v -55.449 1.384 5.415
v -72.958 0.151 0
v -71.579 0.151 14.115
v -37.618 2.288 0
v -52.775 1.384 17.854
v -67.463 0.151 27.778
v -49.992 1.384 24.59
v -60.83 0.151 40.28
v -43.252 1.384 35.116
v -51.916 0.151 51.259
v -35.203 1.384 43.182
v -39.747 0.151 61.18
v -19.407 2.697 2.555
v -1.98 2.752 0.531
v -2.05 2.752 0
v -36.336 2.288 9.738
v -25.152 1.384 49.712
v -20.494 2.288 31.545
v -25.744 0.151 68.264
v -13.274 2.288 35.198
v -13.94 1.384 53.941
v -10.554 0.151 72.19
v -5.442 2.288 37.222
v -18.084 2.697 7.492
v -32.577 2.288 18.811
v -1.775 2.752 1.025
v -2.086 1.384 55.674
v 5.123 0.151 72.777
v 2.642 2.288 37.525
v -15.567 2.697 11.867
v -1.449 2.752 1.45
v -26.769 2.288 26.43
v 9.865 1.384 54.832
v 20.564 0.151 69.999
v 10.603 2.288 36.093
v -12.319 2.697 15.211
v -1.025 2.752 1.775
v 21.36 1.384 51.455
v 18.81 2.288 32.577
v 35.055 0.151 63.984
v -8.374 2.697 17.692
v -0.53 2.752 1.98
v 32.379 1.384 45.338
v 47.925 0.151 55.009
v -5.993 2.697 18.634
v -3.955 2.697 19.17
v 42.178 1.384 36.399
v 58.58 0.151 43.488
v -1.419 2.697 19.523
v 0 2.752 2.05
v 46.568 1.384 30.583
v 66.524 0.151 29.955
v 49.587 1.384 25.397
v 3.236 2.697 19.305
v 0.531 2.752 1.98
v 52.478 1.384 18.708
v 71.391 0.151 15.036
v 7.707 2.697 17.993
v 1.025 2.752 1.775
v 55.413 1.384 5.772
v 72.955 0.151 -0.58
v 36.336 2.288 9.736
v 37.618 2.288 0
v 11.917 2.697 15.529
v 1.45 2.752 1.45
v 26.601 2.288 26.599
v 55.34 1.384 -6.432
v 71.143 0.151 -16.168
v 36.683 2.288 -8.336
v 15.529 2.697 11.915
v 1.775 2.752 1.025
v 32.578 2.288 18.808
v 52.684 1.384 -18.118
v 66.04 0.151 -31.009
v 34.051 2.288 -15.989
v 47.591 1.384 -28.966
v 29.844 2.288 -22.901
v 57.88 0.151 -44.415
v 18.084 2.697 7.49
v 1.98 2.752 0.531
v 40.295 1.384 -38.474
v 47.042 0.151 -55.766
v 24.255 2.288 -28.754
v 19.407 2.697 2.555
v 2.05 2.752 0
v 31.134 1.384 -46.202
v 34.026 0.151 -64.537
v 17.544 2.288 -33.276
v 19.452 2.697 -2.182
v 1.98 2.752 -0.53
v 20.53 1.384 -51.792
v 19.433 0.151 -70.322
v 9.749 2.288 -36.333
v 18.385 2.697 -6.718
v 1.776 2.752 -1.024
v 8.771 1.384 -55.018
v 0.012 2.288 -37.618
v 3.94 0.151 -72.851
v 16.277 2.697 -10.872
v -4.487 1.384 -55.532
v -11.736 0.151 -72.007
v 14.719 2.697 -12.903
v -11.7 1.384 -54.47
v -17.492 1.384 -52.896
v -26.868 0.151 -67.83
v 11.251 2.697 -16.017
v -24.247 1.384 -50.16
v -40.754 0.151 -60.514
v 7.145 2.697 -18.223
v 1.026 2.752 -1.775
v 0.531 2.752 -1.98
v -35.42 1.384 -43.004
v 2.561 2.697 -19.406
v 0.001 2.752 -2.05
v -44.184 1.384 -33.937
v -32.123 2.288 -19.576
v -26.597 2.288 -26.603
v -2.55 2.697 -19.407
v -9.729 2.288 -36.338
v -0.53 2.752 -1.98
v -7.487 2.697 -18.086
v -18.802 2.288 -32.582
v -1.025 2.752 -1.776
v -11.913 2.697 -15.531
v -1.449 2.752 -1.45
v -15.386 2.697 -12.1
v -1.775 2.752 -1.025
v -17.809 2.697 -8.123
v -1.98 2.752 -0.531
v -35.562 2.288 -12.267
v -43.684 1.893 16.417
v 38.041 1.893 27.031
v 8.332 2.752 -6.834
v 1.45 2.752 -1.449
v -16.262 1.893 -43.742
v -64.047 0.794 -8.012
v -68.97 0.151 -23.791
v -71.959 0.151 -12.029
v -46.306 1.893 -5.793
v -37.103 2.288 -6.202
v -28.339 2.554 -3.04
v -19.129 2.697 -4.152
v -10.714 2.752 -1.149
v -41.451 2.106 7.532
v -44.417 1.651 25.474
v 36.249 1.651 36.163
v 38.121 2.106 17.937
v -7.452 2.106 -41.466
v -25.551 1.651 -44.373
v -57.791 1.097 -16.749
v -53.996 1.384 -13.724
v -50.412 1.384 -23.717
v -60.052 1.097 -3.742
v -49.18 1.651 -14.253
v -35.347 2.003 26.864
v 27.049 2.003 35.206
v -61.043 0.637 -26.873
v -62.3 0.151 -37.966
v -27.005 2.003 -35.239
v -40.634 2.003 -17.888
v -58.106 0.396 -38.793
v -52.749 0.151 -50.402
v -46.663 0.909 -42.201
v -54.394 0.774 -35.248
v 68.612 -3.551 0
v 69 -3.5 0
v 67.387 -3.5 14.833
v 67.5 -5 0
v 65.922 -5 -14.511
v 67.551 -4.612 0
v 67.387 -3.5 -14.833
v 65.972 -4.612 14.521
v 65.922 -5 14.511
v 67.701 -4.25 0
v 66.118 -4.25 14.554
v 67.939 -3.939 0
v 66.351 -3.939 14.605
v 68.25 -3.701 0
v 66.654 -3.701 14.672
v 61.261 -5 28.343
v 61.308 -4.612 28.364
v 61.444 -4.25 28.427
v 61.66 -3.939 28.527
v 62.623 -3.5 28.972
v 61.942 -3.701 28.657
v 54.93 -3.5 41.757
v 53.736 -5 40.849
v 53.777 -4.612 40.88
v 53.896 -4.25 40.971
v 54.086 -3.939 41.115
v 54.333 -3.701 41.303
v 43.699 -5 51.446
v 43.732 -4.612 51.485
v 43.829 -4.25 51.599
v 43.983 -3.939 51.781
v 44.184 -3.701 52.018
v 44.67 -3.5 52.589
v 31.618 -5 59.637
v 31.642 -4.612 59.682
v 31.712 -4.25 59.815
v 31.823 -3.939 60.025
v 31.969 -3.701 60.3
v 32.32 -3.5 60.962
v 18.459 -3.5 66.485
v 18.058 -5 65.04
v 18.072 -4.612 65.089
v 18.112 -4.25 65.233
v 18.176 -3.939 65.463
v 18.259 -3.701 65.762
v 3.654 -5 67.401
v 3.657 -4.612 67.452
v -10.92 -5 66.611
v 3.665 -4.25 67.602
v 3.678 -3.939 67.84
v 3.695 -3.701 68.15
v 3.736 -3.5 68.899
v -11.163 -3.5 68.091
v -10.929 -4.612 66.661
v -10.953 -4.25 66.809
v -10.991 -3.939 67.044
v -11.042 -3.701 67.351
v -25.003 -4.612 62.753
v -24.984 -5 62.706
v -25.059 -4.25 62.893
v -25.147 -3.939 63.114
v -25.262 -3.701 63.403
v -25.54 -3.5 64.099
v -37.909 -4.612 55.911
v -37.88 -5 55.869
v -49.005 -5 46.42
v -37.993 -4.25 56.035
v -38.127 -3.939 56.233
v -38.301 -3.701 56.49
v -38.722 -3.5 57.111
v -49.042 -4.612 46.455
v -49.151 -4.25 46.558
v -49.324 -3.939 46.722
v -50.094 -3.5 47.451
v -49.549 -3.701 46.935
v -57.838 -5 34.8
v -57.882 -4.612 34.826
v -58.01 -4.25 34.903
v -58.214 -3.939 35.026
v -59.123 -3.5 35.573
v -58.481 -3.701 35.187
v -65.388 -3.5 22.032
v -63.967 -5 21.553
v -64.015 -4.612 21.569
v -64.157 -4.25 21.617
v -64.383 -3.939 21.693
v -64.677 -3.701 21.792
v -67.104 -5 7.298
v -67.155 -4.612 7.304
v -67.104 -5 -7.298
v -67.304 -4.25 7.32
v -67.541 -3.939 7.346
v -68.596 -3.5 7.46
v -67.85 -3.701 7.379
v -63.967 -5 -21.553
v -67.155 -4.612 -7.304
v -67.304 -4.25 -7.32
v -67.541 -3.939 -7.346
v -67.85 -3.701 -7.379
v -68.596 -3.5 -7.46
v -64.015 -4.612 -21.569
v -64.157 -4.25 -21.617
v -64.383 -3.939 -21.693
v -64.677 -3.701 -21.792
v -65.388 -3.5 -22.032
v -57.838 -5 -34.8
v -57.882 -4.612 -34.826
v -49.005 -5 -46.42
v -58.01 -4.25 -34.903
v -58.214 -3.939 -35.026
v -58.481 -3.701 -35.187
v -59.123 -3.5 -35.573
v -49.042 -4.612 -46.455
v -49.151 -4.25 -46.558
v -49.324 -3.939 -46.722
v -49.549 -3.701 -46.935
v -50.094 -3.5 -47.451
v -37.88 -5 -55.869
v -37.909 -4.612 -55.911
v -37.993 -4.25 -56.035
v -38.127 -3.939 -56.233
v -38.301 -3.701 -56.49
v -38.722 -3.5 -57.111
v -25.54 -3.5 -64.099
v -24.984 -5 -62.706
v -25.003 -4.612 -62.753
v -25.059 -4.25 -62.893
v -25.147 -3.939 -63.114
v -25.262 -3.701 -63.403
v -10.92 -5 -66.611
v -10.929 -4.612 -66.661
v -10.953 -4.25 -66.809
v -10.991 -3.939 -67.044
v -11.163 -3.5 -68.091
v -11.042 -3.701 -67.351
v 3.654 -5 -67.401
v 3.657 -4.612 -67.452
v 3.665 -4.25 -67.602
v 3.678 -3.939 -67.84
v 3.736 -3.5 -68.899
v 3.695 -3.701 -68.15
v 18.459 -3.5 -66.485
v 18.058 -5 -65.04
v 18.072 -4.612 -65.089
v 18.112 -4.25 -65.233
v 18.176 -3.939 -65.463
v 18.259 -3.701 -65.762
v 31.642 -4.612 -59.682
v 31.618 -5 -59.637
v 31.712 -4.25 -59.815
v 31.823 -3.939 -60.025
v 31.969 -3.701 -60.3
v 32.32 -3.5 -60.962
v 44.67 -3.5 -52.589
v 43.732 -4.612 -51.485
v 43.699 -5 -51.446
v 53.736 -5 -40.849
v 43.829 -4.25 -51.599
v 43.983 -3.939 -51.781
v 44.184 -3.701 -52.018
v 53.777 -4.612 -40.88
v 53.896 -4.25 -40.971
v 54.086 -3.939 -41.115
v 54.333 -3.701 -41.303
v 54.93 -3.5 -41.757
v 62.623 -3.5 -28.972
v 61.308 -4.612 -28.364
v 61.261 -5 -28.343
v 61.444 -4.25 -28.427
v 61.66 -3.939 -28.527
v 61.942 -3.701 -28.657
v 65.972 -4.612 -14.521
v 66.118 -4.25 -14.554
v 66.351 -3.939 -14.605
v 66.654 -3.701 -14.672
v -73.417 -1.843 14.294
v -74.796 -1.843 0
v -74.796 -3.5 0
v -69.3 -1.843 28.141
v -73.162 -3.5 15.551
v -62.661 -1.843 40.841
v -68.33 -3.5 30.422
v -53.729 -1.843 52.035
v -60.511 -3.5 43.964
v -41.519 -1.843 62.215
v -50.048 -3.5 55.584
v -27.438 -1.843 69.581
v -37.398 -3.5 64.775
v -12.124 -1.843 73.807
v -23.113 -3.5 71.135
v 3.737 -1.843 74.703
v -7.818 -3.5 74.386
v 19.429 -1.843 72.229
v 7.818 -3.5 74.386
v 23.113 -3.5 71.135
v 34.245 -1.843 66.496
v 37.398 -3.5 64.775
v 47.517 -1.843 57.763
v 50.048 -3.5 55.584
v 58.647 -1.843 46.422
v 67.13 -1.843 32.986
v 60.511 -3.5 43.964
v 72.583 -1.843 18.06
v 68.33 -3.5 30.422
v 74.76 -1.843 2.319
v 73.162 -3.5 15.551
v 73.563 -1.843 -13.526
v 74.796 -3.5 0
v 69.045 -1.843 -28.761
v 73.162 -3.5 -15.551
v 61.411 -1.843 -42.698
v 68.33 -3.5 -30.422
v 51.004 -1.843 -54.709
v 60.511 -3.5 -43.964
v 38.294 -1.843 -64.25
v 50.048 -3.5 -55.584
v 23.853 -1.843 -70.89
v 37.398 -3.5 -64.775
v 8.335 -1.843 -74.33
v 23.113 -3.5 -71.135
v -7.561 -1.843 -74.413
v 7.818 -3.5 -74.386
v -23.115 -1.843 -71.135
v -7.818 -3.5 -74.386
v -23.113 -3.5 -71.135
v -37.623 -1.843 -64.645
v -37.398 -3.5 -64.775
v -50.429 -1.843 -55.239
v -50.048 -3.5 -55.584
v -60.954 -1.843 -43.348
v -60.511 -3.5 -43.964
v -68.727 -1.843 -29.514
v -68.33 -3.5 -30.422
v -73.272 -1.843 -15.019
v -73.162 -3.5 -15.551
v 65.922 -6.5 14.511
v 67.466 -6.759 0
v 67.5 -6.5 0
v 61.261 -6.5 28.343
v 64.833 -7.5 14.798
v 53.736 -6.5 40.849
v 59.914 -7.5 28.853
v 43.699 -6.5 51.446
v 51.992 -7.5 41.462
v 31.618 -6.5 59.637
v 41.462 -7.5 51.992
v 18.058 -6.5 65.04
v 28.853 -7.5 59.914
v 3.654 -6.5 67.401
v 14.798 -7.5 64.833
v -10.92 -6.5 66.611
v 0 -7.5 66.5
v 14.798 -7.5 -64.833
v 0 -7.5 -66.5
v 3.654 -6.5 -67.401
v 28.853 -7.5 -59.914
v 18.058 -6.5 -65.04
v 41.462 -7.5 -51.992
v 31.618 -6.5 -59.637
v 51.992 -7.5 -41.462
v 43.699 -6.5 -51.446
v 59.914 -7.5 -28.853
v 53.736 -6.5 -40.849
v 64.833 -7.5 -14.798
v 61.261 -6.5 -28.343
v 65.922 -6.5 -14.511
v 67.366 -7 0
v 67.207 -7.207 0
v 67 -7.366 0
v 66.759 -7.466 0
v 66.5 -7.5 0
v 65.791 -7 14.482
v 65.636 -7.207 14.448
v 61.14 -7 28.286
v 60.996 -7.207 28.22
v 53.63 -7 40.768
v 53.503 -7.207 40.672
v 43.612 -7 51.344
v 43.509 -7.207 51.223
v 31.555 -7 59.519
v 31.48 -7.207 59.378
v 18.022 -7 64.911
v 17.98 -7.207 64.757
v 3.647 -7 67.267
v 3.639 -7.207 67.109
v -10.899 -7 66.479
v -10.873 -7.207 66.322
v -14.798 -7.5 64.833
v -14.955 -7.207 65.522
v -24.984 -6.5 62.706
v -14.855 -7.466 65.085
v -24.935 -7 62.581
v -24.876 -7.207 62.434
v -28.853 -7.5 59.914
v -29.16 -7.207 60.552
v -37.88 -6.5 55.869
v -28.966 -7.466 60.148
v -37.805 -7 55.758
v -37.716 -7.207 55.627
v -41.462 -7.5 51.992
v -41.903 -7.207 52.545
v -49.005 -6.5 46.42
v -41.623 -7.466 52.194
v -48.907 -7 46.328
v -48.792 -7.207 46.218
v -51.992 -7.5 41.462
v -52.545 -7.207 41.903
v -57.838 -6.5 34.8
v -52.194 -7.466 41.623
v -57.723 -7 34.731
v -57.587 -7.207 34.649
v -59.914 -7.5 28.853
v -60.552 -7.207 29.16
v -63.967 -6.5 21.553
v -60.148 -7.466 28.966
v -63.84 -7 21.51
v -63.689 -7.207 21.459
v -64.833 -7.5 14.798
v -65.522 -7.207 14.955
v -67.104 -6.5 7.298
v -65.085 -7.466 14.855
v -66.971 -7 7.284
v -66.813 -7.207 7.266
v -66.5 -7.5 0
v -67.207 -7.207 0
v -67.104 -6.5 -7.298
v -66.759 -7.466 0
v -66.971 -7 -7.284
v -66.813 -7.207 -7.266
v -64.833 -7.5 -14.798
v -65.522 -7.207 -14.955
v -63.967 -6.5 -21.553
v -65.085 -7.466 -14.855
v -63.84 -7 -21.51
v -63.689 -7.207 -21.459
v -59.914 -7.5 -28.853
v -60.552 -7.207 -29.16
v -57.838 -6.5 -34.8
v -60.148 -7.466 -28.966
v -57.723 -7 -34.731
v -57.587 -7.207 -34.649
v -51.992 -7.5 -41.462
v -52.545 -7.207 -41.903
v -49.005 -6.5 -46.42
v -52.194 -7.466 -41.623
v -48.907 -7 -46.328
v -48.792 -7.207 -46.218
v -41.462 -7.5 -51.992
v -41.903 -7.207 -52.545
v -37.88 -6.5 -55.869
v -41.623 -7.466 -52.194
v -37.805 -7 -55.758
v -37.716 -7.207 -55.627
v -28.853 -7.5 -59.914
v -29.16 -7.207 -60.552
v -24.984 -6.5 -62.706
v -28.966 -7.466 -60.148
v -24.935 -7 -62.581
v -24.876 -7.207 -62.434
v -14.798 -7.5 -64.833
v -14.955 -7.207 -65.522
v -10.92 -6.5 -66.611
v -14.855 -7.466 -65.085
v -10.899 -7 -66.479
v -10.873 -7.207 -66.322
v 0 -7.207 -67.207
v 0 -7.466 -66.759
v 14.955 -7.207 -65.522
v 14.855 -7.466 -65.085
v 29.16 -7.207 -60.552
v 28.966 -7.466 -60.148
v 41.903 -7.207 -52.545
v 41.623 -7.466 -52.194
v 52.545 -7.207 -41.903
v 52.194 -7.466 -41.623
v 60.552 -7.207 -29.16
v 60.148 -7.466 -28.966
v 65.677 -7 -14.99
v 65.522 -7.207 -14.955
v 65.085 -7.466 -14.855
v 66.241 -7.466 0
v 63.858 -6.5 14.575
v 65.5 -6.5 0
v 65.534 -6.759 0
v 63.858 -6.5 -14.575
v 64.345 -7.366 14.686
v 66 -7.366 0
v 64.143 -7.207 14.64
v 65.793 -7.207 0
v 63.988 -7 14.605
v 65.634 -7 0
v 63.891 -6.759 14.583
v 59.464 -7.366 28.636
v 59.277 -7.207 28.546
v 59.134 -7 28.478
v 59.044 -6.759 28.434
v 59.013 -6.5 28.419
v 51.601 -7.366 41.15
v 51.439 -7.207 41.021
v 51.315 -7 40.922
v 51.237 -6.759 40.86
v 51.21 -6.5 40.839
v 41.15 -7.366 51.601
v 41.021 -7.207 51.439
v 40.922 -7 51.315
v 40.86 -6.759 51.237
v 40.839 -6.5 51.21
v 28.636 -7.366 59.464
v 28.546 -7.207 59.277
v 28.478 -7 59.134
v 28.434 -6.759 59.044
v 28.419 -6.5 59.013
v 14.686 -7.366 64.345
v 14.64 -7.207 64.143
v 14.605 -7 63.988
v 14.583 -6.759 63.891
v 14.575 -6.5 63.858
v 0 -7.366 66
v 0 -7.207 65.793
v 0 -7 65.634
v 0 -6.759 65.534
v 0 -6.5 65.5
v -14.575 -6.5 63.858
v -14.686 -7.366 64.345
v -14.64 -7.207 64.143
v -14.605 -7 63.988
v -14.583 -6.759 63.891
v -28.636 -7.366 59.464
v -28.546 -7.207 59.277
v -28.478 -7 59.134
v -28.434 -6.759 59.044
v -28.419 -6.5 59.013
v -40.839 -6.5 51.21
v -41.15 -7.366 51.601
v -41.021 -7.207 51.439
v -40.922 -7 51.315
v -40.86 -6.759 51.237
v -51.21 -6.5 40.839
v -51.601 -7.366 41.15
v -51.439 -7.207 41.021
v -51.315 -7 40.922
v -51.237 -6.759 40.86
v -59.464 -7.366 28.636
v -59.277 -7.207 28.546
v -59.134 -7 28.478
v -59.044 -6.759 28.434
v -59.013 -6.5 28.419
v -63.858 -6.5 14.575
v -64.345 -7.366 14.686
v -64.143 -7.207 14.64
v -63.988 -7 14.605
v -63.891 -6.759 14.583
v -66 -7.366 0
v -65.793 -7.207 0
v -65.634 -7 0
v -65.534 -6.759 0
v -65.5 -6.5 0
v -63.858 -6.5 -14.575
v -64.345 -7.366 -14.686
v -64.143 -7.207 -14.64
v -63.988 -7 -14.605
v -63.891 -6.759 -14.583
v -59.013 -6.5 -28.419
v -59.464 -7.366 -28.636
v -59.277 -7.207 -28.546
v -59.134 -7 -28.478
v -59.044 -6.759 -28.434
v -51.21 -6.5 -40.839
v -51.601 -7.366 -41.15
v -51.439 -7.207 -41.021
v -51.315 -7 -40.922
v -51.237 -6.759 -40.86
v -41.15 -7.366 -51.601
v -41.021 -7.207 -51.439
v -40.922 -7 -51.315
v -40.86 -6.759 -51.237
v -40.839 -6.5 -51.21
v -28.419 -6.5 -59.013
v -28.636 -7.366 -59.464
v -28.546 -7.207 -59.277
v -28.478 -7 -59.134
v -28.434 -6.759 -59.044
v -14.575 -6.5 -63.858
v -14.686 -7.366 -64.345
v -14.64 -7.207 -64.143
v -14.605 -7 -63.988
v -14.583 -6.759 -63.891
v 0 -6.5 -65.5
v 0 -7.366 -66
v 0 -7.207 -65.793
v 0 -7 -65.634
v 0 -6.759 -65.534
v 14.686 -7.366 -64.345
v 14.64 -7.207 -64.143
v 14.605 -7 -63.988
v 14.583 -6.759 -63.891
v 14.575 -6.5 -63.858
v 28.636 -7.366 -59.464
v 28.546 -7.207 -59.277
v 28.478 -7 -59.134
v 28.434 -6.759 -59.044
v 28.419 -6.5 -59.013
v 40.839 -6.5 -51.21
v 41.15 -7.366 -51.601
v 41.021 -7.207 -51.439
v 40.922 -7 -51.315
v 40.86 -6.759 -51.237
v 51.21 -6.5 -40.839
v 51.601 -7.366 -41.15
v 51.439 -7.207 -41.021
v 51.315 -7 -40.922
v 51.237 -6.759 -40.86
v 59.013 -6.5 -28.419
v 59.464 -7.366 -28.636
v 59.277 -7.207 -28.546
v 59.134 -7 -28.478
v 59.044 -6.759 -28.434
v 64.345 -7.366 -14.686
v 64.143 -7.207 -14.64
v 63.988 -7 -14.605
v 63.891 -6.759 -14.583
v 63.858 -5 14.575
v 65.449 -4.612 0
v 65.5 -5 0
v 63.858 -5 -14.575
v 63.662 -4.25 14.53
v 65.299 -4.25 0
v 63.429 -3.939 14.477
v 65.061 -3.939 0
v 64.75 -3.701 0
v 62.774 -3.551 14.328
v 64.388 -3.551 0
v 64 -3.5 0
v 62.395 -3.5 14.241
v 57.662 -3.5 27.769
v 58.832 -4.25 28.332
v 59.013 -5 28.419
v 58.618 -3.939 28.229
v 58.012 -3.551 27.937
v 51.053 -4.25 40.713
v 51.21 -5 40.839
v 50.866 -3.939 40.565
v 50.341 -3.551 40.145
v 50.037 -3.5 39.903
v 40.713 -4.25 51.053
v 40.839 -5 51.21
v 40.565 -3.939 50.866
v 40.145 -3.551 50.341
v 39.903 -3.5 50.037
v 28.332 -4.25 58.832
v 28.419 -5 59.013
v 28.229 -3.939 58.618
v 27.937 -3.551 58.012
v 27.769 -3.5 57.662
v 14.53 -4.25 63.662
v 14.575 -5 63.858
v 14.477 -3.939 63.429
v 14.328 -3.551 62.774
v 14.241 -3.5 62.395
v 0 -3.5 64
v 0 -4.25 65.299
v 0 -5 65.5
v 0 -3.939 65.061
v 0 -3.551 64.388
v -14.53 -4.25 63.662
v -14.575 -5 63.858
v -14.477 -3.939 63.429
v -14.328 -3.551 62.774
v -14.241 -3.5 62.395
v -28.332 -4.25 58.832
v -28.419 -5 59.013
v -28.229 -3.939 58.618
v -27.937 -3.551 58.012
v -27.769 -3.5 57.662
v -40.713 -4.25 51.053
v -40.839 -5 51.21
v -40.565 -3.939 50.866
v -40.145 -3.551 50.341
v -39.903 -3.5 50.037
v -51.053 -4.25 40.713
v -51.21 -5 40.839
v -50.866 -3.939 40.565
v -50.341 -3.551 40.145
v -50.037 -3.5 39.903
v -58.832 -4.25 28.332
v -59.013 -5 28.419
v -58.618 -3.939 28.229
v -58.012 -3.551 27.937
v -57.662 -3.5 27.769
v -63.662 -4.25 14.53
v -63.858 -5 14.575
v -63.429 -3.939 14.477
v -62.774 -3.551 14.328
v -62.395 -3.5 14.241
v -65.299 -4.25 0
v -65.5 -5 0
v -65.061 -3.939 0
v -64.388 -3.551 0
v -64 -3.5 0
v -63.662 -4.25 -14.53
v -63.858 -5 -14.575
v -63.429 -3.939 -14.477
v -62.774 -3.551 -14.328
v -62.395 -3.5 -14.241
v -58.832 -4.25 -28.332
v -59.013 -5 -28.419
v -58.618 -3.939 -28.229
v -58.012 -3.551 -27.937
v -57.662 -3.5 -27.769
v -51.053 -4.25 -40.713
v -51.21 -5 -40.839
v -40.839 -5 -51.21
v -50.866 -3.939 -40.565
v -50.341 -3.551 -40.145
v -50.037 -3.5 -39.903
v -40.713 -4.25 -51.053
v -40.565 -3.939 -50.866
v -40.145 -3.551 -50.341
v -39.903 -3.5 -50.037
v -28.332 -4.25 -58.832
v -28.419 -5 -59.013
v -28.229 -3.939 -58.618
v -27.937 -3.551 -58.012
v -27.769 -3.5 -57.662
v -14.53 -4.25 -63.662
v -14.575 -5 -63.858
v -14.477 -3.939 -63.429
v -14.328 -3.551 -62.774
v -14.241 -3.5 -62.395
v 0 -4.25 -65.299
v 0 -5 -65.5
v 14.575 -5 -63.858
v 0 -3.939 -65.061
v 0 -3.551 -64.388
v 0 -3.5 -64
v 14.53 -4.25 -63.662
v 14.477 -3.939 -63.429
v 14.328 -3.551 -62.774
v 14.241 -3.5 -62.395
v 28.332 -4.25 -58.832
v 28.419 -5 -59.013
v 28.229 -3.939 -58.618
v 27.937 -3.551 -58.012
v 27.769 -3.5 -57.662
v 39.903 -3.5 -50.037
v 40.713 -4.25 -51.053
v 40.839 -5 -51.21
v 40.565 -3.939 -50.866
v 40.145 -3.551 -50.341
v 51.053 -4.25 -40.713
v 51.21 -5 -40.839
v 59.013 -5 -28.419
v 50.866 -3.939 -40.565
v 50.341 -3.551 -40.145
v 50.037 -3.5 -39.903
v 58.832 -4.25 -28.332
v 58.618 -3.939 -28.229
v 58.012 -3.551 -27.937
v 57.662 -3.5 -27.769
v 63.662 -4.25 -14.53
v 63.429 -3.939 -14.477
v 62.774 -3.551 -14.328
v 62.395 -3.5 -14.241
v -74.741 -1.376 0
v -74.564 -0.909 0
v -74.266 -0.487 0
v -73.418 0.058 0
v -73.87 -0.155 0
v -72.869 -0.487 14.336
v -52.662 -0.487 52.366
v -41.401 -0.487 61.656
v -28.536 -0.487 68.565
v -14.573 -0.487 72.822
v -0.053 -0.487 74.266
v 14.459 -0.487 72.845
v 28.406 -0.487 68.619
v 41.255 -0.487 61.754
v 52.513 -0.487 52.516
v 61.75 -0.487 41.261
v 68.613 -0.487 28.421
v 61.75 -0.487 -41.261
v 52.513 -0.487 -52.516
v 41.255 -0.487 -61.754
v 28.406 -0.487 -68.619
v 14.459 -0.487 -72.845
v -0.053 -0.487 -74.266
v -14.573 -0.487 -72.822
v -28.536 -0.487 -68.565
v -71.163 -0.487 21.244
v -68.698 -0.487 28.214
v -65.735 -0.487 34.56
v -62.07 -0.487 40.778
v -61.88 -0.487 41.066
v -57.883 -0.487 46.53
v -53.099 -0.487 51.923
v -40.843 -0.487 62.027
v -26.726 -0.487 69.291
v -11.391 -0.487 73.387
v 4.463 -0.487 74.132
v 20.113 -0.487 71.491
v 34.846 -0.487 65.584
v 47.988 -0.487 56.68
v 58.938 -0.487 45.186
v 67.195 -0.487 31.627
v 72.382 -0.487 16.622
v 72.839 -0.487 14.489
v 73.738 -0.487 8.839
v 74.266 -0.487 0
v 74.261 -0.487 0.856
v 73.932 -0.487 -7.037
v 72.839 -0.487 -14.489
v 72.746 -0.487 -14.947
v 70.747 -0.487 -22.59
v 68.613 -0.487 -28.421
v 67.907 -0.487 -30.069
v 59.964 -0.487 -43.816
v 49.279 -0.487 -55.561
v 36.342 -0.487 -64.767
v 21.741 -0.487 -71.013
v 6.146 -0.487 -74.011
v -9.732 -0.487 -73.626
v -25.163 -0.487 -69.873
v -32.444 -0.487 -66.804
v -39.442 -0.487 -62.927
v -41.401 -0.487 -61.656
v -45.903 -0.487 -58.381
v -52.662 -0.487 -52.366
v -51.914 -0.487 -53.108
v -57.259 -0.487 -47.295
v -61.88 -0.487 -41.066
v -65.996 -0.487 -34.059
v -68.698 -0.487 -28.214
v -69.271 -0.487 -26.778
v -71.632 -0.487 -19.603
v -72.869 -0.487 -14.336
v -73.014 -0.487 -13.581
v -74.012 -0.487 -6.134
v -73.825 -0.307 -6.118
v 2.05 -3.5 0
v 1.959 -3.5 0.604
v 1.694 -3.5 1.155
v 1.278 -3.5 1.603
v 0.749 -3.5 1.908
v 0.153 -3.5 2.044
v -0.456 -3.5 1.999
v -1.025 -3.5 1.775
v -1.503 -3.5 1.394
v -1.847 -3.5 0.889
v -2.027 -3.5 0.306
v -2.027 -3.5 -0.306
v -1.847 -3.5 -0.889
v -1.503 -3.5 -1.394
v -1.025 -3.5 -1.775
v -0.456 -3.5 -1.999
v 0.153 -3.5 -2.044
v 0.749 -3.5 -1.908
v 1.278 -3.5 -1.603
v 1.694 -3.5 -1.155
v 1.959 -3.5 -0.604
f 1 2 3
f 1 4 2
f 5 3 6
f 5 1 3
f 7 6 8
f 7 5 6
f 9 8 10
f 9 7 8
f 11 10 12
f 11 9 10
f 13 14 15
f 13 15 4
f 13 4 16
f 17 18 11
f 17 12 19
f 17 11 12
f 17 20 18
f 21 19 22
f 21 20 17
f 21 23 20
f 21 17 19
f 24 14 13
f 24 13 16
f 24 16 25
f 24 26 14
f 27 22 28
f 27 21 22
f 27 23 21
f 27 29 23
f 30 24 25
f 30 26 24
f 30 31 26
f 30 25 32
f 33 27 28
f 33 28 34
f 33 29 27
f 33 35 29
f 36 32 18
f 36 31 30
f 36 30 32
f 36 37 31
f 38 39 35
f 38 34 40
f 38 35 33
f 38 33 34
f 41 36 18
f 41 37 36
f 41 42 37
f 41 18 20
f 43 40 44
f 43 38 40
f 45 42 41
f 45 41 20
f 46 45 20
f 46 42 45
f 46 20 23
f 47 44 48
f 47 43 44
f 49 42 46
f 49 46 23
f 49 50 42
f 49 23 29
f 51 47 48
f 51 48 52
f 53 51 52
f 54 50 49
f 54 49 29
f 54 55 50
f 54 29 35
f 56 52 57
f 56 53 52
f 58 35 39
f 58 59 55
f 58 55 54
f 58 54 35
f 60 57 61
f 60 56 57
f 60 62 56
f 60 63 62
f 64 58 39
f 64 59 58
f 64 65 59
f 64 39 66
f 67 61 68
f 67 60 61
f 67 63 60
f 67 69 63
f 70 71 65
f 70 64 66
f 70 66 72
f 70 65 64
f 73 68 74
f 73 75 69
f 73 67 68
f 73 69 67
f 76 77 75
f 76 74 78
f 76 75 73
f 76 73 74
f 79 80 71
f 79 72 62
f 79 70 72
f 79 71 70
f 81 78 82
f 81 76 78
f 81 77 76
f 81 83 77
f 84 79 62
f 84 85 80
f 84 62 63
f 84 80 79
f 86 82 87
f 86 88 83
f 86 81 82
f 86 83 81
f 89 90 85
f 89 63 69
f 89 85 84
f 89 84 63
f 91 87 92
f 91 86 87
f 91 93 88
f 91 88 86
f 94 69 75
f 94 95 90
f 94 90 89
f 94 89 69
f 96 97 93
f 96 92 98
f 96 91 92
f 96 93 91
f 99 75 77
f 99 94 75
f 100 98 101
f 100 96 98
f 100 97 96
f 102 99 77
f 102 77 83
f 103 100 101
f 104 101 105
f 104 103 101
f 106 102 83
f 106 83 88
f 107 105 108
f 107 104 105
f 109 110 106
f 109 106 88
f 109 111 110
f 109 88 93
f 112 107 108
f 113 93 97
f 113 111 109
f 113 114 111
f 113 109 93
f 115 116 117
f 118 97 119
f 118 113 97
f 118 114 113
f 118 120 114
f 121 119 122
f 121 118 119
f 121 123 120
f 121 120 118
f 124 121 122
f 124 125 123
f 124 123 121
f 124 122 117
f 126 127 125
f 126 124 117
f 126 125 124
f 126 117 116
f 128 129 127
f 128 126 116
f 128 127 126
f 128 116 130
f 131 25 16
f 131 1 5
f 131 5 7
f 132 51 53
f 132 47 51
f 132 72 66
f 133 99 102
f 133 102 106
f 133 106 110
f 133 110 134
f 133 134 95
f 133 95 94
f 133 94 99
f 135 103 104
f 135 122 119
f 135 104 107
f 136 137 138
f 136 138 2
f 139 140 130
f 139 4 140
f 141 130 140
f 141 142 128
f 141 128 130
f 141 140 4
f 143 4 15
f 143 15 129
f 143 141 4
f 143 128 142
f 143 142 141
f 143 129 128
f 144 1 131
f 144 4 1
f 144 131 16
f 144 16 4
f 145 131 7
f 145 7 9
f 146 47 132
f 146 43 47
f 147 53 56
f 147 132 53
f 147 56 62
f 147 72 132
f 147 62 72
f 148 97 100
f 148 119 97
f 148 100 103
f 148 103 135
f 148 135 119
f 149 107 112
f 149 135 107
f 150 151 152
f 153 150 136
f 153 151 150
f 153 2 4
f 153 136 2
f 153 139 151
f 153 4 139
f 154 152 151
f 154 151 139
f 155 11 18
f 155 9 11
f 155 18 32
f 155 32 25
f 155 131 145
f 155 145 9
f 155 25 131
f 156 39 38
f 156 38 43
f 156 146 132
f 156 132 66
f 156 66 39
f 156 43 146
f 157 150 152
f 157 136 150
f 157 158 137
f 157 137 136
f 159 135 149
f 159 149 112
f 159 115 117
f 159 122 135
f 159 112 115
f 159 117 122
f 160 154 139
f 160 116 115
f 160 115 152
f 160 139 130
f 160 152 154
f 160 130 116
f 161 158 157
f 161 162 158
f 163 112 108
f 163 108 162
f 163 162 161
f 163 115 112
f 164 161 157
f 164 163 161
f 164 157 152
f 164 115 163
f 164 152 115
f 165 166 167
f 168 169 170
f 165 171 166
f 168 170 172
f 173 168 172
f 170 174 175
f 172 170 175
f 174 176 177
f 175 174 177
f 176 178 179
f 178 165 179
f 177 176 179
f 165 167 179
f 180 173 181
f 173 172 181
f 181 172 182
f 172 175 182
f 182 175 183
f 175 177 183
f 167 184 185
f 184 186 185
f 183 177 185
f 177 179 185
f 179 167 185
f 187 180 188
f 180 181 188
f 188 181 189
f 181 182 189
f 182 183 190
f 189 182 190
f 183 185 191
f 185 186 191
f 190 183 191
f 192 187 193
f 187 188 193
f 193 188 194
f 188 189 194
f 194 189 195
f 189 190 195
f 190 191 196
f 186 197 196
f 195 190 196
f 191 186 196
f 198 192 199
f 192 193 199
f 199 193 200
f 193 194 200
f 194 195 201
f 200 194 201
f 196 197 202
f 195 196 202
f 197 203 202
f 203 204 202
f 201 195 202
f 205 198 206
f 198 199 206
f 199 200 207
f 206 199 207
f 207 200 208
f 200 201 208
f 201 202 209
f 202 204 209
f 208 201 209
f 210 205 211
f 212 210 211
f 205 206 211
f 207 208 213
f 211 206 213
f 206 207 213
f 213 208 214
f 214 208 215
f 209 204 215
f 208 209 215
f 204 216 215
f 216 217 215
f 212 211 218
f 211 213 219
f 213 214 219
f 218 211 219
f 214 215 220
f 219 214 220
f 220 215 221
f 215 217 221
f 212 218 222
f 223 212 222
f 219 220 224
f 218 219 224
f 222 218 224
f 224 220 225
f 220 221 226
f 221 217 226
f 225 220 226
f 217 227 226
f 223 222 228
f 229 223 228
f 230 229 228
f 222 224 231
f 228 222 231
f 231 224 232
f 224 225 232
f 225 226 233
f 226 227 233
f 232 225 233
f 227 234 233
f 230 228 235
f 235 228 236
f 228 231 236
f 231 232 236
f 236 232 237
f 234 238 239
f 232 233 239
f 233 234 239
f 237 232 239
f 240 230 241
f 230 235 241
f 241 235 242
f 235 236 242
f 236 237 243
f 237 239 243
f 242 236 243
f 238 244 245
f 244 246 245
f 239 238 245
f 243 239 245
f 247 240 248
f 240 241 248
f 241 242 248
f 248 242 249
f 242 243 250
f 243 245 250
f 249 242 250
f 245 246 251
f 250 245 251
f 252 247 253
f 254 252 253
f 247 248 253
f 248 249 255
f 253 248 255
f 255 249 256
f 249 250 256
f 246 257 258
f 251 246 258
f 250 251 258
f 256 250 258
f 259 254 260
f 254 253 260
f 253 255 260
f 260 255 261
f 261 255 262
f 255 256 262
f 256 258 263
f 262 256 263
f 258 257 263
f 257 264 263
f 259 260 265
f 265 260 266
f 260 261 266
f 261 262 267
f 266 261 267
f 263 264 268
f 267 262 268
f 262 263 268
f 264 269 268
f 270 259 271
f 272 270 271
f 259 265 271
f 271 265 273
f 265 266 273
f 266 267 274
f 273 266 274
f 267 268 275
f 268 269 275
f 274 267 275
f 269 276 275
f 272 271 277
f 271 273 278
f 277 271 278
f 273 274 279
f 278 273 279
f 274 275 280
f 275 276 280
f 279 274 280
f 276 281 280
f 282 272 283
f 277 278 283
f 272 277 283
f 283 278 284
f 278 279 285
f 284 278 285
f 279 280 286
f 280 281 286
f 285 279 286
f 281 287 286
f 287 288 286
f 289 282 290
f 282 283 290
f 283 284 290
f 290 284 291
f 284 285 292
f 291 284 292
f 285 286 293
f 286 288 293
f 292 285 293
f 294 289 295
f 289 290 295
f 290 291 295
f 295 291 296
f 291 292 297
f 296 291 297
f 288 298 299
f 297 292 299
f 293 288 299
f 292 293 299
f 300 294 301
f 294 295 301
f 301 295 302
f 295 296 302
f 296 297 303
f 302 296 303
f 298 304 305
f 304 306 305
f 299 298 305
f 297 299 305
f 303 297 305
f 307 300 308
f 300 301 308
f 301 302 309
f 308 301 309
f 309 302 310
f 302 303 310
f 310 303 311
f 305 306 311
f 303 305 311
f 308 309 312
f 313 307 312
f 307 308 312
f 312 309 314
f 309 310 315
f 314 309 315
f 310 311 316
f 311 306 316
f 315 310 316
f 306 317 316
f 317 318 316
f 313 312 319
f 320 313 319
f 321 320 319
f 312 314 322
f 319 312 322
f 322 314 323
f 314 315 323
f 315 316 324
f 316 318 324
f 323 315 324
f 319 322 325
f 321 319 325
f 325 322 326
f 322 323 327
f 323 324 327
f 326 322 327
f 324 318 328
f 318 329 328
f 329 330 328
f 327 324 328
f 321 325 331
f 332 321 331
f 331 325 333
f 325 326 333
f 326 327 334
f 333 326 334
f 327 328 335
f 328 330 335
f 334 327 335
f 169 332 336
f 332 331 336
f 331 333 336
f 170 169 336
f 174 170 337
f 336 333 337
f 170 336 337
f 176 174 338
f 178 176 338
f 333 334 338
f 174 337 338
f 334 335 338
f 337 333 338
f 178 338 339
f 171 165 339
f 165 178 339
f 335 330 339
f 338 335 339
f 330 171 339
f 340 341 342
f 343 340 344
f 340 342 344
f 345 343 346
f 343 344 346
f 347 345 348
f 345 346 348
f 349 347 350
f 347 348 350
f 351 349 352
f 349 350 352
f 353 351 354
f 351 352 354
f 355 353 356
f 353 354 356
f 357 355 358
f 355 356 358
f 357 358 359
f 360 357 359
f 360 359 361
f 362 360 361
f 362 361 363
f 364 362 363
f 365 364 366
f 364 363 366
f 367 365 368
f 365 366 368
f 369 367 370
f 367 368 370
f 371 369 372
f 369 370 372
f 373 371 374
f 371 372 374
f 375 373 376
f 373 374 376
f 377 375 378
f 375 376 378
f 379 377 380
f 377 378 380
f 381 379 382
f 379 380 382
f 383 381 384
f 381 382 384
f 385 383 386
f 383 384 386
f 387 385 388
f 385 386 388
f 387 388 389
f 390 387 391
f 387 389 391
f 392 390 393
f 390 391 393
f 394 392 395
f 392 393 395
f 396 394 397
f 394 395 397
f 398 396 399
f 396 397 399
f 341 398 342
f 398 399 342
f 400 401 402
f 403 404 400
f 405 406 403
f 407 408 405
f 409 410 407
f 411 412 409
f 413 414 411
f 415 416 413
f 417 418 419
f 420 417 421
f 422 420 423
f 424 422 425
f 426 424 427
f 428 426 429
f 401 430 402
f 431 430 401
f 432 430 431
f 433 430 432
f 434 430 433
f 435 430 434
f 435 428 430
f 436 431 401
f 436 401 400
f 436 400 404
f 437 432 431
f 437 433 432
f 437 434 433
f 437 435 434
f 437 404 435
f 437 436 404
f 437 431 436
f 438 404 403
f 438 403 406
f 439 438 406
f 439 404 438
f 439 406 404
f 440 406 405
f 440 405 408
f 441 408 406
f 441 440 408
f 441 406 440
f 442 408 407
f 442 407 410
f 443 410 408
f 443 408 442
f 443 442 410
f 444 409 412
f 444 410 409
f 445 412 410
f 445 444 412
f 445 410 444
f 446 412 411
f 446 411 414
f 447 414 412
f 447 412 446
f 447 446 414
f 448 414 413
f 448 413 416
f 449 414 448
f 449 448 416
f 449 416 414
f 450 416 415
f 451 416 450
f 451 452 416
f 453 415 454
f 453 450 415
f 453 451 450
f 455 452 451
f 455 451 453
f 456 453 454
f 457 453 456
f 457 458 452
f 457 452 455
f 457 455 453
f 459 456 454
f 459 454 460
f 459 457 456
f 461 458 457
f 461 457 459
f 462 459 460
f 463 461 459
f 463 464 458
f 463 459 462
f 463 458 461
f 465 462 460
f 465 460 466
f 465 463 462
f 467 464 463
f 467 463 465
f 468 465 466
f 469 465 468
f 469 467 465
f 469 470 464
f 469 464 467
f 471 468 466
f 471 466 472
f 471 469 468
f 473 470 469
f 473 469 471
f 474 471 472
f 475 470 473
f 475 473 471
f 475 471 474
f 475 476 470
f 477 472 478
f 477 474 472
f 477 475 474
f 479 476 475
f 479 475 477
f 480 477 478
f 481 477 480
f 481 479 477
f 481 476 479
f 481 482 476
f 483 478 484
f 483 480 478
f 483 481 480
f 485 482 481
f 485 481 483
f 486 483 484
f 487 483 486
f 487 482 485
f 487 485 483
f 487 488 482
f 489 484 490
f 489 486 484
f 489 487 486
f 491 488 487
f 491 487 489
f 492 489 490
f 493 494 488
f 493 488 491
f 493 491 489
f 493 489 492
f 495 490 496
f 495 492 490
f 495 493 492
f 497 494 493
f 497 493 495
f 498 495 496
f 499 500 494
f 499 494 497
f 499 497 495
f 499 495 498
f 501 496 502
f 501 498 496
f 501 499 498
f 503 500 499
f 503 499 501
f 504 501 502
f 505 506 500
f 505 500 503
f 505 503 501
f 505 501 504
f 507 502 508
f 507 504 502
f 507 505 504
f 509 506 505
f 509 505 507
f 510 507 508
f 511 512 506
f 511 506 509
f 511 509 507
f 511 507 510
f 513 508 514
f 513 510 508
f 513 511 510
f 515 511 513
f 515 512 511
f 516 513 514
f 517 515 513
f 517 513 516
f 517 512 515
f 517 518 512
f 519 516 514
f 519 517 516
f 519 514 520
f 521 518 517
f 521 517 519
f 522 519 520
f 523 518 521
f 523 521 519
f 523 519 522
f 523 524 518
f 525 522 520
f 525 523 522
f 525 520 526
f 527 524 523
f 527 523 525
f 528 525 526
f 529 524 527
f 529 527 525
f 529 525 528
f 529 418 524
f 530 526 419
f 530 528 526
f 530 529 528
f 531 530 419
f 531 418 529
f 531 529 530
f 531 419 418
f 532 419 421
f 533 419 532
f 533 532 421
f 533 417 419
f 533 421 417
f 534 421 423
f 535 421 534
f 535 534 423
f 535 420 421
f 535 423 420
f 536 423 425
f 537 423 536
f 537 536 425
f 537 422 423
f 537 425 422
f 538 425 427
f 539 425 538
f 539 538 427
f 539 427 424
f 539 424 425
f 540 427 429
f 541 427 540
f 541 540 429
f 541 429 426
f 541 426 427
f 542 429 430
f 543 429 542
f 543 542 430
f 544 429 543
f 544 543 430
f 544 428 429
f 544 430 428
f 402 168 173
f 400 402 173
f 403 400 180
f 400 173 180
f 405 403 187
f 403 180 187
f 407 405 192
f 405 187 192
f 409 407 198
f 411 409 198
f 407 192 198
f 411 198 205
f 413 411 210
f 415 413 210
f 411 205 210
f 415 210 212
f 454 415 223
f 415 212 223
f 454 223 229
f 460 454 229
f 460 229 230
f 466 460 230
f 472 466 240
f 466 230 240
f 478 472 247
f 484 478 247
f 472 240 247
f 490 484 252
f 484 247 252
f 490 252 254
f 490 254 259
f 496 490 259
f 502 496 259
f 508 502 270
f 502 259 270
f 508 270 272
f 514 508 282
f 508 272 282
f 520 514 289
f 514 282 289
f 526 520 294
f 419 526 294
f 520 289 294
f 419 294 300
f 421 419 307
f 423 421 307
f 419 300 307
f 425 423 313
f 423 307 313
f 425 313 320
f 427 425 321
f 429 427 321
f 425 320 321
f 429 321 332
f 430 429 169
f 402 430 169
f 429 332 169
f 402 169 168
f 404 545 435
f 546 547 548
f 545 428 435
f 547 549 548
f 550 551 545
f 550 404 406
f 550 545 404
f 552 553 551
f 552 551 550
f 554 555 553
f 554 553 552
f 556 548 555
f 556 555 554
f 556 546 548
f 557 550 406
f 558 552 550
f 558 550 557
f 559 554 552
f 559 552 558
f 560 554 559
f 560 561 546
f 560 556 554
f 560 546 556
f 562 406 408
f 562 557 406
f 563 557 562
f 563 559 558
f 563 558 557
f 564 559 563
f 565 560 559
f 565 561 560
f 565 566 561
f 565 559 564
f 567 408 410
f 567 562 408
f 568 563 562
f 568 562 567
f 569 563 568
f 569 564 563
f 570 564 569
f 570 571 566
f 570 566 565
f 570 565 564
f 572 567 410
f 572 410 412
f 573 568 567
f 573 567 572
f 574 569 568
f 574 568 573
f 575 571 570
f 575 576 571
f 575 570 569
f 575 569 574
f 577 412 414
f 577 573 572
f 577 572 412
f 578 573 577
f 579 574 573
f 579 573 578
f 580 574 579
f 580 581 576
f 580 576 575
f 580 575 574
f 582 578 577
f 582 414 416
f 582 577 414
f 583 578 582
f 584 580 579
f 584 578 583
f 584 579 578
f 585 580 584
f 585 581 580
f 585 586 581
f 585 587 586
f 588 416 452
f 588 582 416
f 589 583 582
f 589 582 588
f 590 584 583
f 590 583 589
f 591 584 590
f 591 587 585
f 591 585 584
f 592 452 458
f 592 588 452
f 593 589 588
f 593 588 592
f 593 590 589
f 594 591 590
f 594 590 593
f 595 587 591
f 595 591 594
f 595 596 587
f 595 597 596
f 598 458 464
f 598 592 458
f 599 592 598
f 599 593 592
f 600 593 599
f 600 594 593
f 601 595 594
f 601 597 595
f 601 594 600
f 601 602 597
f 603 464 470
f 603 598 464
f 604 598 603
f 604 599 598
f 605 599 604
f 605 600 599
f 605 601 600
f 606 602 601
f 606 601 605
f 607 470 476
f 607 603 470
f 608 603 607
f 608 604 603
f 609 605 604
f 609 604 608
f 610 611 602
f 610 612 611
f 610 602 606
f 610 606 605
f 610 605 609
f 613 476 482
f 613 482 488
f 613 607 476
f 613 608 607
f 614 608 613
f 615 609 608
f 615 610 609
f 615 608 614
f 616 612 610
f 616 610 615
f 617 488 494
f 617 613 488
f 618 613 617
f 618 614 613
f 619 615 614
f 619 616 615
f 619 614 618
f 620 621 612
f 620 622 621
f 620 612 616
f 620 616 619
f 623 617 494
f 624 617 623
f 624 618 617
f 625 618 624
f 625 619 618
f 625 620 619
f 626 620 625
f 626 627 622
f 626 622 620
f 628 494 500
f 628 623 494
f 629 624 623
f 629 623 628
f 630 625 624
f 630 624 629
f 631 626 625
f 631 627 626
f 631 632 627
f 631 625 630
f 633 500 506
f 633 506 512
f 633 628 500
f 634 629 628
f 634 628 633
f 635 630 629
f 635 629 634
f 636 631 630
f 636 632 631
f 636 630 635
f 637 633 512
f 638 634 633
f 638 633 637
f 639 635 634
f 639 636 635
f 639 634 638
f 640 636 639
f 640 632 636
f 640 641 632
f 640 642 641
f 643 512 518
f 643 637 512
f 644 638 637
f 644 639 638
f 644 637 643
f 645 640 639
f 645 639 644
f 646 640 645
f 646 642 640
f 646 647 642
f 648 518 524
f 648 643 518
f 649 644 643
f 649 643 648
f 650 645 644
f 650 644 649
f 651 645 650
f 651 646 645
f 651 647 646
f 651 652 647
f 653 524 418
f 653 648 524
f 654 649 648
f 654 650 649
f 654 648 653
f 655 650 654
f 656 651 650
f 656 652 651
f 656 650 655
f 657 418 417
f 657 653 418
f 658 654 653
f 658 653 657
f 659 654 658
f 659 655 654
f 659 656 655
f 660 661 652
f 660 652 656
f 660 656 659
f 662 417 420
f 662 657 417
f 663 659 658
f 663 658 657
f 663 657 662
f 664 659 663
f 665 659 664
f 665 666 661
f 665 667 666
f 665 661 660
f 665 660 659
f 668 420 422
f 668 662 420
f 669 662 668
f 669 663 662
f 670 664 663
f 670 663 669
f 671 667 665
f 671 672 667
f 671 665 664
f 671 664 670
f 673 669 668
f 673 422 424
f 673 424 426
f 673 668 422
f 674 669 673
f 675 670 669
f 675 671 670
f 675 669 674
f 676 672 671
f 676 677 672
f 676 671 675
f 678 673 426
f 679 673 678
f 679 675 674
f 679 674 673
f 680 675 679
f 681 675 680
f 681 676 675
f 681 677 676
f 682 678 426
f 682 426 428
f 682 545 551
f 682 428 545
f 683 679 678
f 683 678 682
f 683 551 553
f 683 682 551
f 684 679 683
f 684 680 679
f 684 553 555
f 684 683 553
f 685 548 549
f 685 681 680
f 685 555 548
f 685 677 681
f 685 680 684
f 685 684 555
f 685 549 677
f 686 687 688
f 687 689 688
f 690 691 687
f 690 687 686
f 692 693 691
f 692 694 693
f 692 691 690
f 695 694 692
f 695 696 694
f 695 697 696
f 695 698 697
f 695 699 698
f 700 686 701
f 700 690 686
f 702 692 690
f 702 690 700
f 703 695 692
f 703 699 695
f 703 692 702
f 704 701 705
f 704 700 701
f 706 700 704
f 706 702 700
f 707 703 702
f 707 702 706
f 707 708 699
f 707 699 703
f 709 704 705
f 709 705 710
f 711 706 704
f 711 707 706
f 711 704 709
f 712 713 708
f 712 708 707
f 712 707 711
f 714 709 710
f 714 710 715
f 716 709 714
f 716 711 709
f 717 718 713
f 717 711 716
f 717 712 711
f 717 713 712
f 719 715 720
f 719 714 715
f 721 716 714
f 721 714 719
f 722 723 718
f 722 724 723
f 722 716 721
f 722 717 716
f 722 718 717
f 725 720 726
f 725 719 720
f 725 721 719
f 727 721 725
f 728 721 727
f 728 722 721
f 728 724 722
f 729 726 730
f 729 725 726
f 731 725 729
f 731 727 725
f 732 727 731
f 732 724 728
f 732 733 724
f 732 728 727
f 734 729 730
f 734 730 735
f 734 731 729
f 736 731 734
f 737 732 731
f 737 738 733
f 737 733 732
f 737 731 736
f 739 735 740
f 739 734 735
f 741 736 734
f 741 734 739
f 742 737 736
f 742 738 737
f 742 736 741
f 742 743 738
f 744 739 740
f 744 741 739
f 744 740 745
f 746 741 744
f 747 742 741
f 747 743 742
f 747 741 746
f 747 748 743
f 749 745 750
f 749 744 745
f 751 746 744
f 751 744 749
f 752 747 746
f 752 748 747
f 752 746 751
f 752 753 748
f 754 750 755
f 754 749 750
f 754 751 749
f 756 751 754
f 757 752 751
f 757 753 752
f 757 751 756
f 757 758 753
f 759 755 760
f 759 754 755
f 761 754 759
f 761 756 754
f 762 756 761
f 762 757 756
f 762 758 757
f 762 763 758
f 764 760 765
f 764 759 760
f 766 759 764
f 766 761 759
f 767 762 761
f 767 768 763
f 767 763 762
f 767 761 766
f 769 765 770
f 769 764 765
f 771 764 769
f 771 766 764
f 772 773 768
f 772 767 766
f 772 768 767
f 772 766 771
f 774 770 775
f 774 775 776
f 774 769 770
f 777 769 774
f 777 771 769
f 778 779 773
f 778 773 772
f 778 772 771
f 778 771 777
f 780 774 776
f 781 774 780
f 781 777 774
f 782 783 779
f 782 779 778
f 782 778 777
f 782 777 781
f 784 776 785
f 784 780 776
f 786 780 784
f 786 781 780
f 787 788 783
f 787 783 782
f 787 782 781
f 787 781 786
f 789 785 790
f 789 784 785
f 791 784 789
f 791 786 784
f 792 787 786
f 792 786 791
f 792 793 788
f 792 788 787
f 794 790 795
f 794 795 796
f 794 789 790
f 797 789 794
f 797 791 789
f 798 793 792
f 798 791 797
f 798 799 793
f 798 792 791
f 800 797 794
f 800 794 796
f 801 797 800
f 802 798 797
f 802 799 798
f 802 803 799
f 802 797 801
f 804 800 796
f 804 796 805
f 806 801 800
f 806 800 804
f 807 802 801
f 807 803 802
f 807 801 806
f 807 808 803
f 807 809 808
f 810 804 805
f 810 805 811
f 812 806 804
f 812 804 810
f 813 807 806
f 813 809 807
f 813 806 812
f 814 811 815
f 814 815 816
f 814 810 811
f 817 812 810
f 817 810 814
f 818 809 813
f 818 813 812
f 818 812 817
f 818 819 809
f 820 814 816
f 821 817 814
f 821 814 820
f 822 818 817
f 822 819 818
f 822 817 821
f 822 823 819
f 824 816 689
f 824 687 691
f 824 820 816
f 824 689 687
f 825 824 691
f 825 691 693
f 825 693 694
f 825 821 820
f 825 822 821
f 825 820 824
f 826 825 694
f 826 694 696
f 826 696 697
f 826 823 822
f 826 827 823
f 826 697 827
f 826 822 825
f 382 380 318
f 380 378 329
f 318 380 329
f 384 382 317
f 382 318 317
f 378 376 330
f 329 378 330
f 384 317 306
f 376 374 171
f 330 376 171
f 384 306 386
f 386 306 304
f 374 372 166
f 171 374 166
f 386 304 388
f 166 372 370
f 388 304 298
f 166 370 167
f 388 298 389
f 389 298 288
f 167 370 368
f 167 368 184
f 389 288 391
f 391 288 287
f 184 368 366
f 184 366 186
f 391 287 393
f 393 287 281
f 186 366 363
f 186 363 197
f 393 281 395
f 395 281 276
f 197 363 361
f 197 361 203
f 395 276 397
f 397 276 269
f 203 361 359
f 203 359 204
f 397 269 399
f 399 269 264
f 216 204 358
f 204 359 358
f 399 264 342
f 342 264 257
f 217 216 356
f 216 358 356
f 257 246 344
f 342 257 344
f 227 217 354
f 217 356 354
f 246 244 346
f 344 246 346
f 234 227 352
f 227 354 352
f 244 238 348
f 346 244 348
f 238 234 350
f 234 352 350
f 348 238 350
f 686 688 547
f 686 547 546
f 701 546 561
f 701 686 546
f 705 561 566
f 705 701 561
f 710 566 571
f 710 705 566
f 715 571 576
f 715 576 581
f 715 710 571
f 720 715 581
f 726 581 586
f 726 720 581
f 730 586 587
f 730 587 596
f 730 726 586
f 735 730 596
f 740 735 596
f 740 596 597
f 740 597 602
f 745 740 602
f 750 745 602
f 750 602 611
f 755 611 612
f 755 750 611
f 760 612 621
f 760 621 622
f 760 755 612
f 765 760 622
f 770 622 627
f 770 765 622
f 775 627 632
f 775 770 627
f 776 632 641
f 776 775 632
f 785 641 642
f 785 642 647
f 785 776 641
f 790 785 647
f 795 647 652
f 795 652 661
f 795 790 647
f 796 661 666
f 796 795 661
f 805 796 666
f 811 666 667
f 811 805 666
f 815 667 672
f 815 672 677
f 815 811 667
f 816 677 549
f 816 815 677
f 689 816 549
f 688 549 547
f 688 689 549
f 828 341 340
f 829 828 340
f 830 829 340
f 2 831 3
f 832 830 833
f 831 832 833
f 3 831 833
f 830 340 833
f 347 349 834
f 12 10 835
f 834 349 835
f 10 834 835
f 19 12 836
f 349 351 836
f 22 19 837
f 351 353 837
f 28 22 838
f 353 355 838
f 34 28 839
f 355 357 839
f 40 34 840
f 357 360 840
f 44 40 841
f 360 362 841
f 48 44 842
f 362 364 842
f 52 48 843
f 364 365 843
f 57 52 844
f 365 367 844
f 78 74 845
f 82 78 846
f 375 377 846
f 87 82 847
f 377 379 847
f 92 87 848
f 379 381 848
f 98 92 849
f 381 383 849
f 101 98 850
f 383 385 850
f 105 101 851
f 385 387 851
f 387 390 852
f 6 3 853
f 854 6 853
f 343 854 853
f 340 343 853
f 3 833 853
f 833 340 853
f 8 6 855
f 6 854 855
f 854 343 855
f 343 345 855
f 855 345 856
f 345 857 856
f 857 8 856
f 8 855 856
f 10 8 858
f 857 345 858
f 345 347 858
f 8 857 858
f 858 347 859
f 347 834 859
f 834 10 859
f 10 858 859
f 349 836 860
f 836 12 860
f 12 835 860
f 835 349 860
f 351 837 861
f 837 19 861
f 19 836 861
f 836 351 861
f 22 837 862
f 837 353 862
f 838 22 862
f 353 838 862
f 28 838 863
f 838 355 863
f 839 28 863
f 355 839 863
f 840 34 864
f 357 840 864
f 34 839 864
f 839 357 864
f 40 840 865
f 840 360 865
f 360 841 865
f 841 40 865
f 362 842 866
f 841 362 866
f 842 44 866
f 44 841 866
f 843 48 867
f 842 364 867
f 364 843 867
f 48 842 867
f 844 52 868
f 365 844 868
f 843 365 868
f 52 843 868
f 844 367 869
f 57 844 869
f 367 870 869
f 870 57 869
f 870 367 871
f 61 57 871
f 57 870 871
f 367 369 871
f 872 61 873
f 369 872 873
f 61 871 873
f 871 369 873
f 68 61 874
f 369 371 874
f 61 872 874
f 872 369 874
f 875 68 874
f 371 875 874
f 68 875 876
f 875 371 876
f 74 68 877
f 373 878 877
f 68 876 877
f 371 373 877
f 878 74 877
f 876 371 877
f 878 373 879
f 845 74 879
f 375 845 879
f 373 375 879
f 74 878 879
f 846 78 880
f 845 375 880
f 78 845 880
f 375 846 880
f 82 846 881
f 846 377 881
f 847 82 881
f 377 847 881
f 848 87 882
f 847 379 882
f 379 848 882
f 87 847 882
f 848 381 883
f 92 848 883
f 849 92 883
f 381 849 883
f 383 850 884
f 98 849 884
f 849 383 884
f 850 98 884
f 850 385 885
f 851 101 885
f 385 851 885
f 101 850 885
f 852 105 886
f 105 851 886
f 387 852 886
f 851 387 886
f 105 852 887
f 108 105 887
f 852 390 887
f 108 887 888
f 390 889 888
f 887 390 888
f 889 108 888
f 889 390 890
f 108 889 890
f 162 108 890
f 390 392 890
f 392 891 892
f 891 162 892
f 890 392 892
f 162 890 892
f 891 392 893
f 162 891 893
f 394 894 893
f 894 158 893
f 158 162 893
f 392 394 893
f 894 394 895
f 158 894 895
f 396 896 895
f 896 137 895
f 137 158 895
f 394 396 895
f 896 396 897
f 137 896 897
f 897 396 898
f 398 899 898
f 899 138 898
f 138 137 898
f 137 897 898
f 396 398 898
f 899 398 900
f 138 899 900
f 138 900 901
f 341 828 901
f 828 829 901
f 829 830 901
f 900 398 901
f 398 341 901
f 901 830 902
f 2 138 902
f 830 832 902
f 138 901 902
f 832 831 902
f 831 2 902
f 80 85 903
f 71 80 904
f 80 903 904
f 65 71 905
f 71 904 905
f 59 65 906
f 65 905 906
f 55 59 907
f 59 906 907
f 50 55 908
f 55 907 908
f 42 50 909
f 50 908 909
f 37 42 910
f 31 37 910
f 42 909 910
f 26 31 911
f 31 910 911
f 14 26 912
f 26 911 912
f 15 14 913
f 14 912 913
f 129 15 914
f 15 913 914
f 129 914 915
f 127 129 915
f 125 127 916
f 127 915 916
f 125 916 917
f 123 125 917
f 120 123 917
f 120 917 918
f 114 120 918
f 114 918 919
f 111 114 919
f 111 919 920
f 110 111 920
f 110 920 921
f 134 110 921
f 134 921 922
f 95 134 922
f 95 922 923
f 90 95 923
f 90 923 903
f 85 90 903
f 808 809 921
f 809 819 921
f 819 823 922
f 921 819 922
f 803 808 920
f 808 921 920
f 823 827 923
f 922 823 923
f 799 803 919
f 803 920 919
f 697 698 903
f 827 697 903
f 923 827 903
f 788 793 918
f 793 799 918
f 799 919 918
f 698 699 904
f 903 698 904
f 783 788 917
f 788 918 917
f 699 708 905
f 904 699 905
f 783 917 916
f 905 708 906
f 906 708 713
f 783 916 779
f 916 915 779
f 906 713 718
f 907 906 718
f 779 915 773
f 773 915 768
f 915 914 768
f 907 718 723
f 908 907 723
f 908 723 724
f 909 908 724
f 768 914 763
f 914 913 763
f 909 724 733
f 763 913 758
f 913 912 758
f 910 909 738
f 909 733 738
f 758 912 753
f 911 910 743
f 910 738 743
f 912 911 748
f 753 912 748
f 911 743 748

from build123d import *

# Parameters (mm, degrees)
F2_R     = 67.5
F2_R_2   = 65.5
F3_DEPTH = 4
F4_R     = 0.99999
F5_R     = 1.5
F6_R     = 2
F7_R     = 2.05
F8_DEPTH = 6.2575644614


# Not quite as in the source:
# - a fillet or chamfer is up to 0.001 mm smaller than in the source, because OpenCascade refuses the exact size


with BuildPart() as f1:
    # F0 (on Top) → F1 (revolve)
    with BuildSketch(Plane.XY):
        with BuildLine():
            add(Edge.make_bspline(
                [(-74.796, 0), (-63.2667945233, 0.9578141715), (-36.2383694529, 2.7601661408), (-11.99670654, 2.7739654731), (0, 2.7481611414)],
                knots=[0, 0, 0, 0, 0.5050477324, 1, 1, 1, 1], degree=3))
            Line((-74.796, 0), (-74.796, -3.5))
            Line((-74.796, -3.5), (0, -3.5))
            Line((0, -3.5), (0, 0))
            Line((0, 0), (0, 2.7481611414))
        make_face()
    revolve(axis=Axis((0, -1.75, 0), (0, 1, 0)))

    # F2 (on face) → F3 (join)
    with BuildSketch(Plane.XZ.offset(3.5)):
        Circle(F2_R)
        Circle(F2_R_2, mode=Mode.SUBTRACT)
    extrude(amount=F3_DEPTH)

    # F4 (radius 1 in the source; OpenCascade refuses exactly that, so slightly less here)
    f4_edges = [f1.edges().sort_by_distance(p)[0] for p in [
        (-65.5, -7.5, 0),
        (-67.5, -7.5, 0),
    ]]
    fillet(f4_edges, radius=F4_R)

    # F5
    f5_edges = [f1.edges().sort_by_distance(p)[0] for p in [
        (-65.5, -3.5, 0),
        (-67.5, -3.5, 0),
    ]]
    fillet(f5_edges, radius=F5_R)

    # F6
    f6_edges = [f1.edges().sort_by_distance(p)[0] for p in [
        (74.796, 0, 0),
    ]]
    fillet(f6_edges, radius=F6_R)

    # F7 (on face) → F8 (cut, through all)
    with BuildSketch(Plane.XZ.offset(3.5)):
        Circle(F7_R)
    extrude(amount=-F8_DEPTH, mode=Mode.SUBTRACT)


solid = f1.part
